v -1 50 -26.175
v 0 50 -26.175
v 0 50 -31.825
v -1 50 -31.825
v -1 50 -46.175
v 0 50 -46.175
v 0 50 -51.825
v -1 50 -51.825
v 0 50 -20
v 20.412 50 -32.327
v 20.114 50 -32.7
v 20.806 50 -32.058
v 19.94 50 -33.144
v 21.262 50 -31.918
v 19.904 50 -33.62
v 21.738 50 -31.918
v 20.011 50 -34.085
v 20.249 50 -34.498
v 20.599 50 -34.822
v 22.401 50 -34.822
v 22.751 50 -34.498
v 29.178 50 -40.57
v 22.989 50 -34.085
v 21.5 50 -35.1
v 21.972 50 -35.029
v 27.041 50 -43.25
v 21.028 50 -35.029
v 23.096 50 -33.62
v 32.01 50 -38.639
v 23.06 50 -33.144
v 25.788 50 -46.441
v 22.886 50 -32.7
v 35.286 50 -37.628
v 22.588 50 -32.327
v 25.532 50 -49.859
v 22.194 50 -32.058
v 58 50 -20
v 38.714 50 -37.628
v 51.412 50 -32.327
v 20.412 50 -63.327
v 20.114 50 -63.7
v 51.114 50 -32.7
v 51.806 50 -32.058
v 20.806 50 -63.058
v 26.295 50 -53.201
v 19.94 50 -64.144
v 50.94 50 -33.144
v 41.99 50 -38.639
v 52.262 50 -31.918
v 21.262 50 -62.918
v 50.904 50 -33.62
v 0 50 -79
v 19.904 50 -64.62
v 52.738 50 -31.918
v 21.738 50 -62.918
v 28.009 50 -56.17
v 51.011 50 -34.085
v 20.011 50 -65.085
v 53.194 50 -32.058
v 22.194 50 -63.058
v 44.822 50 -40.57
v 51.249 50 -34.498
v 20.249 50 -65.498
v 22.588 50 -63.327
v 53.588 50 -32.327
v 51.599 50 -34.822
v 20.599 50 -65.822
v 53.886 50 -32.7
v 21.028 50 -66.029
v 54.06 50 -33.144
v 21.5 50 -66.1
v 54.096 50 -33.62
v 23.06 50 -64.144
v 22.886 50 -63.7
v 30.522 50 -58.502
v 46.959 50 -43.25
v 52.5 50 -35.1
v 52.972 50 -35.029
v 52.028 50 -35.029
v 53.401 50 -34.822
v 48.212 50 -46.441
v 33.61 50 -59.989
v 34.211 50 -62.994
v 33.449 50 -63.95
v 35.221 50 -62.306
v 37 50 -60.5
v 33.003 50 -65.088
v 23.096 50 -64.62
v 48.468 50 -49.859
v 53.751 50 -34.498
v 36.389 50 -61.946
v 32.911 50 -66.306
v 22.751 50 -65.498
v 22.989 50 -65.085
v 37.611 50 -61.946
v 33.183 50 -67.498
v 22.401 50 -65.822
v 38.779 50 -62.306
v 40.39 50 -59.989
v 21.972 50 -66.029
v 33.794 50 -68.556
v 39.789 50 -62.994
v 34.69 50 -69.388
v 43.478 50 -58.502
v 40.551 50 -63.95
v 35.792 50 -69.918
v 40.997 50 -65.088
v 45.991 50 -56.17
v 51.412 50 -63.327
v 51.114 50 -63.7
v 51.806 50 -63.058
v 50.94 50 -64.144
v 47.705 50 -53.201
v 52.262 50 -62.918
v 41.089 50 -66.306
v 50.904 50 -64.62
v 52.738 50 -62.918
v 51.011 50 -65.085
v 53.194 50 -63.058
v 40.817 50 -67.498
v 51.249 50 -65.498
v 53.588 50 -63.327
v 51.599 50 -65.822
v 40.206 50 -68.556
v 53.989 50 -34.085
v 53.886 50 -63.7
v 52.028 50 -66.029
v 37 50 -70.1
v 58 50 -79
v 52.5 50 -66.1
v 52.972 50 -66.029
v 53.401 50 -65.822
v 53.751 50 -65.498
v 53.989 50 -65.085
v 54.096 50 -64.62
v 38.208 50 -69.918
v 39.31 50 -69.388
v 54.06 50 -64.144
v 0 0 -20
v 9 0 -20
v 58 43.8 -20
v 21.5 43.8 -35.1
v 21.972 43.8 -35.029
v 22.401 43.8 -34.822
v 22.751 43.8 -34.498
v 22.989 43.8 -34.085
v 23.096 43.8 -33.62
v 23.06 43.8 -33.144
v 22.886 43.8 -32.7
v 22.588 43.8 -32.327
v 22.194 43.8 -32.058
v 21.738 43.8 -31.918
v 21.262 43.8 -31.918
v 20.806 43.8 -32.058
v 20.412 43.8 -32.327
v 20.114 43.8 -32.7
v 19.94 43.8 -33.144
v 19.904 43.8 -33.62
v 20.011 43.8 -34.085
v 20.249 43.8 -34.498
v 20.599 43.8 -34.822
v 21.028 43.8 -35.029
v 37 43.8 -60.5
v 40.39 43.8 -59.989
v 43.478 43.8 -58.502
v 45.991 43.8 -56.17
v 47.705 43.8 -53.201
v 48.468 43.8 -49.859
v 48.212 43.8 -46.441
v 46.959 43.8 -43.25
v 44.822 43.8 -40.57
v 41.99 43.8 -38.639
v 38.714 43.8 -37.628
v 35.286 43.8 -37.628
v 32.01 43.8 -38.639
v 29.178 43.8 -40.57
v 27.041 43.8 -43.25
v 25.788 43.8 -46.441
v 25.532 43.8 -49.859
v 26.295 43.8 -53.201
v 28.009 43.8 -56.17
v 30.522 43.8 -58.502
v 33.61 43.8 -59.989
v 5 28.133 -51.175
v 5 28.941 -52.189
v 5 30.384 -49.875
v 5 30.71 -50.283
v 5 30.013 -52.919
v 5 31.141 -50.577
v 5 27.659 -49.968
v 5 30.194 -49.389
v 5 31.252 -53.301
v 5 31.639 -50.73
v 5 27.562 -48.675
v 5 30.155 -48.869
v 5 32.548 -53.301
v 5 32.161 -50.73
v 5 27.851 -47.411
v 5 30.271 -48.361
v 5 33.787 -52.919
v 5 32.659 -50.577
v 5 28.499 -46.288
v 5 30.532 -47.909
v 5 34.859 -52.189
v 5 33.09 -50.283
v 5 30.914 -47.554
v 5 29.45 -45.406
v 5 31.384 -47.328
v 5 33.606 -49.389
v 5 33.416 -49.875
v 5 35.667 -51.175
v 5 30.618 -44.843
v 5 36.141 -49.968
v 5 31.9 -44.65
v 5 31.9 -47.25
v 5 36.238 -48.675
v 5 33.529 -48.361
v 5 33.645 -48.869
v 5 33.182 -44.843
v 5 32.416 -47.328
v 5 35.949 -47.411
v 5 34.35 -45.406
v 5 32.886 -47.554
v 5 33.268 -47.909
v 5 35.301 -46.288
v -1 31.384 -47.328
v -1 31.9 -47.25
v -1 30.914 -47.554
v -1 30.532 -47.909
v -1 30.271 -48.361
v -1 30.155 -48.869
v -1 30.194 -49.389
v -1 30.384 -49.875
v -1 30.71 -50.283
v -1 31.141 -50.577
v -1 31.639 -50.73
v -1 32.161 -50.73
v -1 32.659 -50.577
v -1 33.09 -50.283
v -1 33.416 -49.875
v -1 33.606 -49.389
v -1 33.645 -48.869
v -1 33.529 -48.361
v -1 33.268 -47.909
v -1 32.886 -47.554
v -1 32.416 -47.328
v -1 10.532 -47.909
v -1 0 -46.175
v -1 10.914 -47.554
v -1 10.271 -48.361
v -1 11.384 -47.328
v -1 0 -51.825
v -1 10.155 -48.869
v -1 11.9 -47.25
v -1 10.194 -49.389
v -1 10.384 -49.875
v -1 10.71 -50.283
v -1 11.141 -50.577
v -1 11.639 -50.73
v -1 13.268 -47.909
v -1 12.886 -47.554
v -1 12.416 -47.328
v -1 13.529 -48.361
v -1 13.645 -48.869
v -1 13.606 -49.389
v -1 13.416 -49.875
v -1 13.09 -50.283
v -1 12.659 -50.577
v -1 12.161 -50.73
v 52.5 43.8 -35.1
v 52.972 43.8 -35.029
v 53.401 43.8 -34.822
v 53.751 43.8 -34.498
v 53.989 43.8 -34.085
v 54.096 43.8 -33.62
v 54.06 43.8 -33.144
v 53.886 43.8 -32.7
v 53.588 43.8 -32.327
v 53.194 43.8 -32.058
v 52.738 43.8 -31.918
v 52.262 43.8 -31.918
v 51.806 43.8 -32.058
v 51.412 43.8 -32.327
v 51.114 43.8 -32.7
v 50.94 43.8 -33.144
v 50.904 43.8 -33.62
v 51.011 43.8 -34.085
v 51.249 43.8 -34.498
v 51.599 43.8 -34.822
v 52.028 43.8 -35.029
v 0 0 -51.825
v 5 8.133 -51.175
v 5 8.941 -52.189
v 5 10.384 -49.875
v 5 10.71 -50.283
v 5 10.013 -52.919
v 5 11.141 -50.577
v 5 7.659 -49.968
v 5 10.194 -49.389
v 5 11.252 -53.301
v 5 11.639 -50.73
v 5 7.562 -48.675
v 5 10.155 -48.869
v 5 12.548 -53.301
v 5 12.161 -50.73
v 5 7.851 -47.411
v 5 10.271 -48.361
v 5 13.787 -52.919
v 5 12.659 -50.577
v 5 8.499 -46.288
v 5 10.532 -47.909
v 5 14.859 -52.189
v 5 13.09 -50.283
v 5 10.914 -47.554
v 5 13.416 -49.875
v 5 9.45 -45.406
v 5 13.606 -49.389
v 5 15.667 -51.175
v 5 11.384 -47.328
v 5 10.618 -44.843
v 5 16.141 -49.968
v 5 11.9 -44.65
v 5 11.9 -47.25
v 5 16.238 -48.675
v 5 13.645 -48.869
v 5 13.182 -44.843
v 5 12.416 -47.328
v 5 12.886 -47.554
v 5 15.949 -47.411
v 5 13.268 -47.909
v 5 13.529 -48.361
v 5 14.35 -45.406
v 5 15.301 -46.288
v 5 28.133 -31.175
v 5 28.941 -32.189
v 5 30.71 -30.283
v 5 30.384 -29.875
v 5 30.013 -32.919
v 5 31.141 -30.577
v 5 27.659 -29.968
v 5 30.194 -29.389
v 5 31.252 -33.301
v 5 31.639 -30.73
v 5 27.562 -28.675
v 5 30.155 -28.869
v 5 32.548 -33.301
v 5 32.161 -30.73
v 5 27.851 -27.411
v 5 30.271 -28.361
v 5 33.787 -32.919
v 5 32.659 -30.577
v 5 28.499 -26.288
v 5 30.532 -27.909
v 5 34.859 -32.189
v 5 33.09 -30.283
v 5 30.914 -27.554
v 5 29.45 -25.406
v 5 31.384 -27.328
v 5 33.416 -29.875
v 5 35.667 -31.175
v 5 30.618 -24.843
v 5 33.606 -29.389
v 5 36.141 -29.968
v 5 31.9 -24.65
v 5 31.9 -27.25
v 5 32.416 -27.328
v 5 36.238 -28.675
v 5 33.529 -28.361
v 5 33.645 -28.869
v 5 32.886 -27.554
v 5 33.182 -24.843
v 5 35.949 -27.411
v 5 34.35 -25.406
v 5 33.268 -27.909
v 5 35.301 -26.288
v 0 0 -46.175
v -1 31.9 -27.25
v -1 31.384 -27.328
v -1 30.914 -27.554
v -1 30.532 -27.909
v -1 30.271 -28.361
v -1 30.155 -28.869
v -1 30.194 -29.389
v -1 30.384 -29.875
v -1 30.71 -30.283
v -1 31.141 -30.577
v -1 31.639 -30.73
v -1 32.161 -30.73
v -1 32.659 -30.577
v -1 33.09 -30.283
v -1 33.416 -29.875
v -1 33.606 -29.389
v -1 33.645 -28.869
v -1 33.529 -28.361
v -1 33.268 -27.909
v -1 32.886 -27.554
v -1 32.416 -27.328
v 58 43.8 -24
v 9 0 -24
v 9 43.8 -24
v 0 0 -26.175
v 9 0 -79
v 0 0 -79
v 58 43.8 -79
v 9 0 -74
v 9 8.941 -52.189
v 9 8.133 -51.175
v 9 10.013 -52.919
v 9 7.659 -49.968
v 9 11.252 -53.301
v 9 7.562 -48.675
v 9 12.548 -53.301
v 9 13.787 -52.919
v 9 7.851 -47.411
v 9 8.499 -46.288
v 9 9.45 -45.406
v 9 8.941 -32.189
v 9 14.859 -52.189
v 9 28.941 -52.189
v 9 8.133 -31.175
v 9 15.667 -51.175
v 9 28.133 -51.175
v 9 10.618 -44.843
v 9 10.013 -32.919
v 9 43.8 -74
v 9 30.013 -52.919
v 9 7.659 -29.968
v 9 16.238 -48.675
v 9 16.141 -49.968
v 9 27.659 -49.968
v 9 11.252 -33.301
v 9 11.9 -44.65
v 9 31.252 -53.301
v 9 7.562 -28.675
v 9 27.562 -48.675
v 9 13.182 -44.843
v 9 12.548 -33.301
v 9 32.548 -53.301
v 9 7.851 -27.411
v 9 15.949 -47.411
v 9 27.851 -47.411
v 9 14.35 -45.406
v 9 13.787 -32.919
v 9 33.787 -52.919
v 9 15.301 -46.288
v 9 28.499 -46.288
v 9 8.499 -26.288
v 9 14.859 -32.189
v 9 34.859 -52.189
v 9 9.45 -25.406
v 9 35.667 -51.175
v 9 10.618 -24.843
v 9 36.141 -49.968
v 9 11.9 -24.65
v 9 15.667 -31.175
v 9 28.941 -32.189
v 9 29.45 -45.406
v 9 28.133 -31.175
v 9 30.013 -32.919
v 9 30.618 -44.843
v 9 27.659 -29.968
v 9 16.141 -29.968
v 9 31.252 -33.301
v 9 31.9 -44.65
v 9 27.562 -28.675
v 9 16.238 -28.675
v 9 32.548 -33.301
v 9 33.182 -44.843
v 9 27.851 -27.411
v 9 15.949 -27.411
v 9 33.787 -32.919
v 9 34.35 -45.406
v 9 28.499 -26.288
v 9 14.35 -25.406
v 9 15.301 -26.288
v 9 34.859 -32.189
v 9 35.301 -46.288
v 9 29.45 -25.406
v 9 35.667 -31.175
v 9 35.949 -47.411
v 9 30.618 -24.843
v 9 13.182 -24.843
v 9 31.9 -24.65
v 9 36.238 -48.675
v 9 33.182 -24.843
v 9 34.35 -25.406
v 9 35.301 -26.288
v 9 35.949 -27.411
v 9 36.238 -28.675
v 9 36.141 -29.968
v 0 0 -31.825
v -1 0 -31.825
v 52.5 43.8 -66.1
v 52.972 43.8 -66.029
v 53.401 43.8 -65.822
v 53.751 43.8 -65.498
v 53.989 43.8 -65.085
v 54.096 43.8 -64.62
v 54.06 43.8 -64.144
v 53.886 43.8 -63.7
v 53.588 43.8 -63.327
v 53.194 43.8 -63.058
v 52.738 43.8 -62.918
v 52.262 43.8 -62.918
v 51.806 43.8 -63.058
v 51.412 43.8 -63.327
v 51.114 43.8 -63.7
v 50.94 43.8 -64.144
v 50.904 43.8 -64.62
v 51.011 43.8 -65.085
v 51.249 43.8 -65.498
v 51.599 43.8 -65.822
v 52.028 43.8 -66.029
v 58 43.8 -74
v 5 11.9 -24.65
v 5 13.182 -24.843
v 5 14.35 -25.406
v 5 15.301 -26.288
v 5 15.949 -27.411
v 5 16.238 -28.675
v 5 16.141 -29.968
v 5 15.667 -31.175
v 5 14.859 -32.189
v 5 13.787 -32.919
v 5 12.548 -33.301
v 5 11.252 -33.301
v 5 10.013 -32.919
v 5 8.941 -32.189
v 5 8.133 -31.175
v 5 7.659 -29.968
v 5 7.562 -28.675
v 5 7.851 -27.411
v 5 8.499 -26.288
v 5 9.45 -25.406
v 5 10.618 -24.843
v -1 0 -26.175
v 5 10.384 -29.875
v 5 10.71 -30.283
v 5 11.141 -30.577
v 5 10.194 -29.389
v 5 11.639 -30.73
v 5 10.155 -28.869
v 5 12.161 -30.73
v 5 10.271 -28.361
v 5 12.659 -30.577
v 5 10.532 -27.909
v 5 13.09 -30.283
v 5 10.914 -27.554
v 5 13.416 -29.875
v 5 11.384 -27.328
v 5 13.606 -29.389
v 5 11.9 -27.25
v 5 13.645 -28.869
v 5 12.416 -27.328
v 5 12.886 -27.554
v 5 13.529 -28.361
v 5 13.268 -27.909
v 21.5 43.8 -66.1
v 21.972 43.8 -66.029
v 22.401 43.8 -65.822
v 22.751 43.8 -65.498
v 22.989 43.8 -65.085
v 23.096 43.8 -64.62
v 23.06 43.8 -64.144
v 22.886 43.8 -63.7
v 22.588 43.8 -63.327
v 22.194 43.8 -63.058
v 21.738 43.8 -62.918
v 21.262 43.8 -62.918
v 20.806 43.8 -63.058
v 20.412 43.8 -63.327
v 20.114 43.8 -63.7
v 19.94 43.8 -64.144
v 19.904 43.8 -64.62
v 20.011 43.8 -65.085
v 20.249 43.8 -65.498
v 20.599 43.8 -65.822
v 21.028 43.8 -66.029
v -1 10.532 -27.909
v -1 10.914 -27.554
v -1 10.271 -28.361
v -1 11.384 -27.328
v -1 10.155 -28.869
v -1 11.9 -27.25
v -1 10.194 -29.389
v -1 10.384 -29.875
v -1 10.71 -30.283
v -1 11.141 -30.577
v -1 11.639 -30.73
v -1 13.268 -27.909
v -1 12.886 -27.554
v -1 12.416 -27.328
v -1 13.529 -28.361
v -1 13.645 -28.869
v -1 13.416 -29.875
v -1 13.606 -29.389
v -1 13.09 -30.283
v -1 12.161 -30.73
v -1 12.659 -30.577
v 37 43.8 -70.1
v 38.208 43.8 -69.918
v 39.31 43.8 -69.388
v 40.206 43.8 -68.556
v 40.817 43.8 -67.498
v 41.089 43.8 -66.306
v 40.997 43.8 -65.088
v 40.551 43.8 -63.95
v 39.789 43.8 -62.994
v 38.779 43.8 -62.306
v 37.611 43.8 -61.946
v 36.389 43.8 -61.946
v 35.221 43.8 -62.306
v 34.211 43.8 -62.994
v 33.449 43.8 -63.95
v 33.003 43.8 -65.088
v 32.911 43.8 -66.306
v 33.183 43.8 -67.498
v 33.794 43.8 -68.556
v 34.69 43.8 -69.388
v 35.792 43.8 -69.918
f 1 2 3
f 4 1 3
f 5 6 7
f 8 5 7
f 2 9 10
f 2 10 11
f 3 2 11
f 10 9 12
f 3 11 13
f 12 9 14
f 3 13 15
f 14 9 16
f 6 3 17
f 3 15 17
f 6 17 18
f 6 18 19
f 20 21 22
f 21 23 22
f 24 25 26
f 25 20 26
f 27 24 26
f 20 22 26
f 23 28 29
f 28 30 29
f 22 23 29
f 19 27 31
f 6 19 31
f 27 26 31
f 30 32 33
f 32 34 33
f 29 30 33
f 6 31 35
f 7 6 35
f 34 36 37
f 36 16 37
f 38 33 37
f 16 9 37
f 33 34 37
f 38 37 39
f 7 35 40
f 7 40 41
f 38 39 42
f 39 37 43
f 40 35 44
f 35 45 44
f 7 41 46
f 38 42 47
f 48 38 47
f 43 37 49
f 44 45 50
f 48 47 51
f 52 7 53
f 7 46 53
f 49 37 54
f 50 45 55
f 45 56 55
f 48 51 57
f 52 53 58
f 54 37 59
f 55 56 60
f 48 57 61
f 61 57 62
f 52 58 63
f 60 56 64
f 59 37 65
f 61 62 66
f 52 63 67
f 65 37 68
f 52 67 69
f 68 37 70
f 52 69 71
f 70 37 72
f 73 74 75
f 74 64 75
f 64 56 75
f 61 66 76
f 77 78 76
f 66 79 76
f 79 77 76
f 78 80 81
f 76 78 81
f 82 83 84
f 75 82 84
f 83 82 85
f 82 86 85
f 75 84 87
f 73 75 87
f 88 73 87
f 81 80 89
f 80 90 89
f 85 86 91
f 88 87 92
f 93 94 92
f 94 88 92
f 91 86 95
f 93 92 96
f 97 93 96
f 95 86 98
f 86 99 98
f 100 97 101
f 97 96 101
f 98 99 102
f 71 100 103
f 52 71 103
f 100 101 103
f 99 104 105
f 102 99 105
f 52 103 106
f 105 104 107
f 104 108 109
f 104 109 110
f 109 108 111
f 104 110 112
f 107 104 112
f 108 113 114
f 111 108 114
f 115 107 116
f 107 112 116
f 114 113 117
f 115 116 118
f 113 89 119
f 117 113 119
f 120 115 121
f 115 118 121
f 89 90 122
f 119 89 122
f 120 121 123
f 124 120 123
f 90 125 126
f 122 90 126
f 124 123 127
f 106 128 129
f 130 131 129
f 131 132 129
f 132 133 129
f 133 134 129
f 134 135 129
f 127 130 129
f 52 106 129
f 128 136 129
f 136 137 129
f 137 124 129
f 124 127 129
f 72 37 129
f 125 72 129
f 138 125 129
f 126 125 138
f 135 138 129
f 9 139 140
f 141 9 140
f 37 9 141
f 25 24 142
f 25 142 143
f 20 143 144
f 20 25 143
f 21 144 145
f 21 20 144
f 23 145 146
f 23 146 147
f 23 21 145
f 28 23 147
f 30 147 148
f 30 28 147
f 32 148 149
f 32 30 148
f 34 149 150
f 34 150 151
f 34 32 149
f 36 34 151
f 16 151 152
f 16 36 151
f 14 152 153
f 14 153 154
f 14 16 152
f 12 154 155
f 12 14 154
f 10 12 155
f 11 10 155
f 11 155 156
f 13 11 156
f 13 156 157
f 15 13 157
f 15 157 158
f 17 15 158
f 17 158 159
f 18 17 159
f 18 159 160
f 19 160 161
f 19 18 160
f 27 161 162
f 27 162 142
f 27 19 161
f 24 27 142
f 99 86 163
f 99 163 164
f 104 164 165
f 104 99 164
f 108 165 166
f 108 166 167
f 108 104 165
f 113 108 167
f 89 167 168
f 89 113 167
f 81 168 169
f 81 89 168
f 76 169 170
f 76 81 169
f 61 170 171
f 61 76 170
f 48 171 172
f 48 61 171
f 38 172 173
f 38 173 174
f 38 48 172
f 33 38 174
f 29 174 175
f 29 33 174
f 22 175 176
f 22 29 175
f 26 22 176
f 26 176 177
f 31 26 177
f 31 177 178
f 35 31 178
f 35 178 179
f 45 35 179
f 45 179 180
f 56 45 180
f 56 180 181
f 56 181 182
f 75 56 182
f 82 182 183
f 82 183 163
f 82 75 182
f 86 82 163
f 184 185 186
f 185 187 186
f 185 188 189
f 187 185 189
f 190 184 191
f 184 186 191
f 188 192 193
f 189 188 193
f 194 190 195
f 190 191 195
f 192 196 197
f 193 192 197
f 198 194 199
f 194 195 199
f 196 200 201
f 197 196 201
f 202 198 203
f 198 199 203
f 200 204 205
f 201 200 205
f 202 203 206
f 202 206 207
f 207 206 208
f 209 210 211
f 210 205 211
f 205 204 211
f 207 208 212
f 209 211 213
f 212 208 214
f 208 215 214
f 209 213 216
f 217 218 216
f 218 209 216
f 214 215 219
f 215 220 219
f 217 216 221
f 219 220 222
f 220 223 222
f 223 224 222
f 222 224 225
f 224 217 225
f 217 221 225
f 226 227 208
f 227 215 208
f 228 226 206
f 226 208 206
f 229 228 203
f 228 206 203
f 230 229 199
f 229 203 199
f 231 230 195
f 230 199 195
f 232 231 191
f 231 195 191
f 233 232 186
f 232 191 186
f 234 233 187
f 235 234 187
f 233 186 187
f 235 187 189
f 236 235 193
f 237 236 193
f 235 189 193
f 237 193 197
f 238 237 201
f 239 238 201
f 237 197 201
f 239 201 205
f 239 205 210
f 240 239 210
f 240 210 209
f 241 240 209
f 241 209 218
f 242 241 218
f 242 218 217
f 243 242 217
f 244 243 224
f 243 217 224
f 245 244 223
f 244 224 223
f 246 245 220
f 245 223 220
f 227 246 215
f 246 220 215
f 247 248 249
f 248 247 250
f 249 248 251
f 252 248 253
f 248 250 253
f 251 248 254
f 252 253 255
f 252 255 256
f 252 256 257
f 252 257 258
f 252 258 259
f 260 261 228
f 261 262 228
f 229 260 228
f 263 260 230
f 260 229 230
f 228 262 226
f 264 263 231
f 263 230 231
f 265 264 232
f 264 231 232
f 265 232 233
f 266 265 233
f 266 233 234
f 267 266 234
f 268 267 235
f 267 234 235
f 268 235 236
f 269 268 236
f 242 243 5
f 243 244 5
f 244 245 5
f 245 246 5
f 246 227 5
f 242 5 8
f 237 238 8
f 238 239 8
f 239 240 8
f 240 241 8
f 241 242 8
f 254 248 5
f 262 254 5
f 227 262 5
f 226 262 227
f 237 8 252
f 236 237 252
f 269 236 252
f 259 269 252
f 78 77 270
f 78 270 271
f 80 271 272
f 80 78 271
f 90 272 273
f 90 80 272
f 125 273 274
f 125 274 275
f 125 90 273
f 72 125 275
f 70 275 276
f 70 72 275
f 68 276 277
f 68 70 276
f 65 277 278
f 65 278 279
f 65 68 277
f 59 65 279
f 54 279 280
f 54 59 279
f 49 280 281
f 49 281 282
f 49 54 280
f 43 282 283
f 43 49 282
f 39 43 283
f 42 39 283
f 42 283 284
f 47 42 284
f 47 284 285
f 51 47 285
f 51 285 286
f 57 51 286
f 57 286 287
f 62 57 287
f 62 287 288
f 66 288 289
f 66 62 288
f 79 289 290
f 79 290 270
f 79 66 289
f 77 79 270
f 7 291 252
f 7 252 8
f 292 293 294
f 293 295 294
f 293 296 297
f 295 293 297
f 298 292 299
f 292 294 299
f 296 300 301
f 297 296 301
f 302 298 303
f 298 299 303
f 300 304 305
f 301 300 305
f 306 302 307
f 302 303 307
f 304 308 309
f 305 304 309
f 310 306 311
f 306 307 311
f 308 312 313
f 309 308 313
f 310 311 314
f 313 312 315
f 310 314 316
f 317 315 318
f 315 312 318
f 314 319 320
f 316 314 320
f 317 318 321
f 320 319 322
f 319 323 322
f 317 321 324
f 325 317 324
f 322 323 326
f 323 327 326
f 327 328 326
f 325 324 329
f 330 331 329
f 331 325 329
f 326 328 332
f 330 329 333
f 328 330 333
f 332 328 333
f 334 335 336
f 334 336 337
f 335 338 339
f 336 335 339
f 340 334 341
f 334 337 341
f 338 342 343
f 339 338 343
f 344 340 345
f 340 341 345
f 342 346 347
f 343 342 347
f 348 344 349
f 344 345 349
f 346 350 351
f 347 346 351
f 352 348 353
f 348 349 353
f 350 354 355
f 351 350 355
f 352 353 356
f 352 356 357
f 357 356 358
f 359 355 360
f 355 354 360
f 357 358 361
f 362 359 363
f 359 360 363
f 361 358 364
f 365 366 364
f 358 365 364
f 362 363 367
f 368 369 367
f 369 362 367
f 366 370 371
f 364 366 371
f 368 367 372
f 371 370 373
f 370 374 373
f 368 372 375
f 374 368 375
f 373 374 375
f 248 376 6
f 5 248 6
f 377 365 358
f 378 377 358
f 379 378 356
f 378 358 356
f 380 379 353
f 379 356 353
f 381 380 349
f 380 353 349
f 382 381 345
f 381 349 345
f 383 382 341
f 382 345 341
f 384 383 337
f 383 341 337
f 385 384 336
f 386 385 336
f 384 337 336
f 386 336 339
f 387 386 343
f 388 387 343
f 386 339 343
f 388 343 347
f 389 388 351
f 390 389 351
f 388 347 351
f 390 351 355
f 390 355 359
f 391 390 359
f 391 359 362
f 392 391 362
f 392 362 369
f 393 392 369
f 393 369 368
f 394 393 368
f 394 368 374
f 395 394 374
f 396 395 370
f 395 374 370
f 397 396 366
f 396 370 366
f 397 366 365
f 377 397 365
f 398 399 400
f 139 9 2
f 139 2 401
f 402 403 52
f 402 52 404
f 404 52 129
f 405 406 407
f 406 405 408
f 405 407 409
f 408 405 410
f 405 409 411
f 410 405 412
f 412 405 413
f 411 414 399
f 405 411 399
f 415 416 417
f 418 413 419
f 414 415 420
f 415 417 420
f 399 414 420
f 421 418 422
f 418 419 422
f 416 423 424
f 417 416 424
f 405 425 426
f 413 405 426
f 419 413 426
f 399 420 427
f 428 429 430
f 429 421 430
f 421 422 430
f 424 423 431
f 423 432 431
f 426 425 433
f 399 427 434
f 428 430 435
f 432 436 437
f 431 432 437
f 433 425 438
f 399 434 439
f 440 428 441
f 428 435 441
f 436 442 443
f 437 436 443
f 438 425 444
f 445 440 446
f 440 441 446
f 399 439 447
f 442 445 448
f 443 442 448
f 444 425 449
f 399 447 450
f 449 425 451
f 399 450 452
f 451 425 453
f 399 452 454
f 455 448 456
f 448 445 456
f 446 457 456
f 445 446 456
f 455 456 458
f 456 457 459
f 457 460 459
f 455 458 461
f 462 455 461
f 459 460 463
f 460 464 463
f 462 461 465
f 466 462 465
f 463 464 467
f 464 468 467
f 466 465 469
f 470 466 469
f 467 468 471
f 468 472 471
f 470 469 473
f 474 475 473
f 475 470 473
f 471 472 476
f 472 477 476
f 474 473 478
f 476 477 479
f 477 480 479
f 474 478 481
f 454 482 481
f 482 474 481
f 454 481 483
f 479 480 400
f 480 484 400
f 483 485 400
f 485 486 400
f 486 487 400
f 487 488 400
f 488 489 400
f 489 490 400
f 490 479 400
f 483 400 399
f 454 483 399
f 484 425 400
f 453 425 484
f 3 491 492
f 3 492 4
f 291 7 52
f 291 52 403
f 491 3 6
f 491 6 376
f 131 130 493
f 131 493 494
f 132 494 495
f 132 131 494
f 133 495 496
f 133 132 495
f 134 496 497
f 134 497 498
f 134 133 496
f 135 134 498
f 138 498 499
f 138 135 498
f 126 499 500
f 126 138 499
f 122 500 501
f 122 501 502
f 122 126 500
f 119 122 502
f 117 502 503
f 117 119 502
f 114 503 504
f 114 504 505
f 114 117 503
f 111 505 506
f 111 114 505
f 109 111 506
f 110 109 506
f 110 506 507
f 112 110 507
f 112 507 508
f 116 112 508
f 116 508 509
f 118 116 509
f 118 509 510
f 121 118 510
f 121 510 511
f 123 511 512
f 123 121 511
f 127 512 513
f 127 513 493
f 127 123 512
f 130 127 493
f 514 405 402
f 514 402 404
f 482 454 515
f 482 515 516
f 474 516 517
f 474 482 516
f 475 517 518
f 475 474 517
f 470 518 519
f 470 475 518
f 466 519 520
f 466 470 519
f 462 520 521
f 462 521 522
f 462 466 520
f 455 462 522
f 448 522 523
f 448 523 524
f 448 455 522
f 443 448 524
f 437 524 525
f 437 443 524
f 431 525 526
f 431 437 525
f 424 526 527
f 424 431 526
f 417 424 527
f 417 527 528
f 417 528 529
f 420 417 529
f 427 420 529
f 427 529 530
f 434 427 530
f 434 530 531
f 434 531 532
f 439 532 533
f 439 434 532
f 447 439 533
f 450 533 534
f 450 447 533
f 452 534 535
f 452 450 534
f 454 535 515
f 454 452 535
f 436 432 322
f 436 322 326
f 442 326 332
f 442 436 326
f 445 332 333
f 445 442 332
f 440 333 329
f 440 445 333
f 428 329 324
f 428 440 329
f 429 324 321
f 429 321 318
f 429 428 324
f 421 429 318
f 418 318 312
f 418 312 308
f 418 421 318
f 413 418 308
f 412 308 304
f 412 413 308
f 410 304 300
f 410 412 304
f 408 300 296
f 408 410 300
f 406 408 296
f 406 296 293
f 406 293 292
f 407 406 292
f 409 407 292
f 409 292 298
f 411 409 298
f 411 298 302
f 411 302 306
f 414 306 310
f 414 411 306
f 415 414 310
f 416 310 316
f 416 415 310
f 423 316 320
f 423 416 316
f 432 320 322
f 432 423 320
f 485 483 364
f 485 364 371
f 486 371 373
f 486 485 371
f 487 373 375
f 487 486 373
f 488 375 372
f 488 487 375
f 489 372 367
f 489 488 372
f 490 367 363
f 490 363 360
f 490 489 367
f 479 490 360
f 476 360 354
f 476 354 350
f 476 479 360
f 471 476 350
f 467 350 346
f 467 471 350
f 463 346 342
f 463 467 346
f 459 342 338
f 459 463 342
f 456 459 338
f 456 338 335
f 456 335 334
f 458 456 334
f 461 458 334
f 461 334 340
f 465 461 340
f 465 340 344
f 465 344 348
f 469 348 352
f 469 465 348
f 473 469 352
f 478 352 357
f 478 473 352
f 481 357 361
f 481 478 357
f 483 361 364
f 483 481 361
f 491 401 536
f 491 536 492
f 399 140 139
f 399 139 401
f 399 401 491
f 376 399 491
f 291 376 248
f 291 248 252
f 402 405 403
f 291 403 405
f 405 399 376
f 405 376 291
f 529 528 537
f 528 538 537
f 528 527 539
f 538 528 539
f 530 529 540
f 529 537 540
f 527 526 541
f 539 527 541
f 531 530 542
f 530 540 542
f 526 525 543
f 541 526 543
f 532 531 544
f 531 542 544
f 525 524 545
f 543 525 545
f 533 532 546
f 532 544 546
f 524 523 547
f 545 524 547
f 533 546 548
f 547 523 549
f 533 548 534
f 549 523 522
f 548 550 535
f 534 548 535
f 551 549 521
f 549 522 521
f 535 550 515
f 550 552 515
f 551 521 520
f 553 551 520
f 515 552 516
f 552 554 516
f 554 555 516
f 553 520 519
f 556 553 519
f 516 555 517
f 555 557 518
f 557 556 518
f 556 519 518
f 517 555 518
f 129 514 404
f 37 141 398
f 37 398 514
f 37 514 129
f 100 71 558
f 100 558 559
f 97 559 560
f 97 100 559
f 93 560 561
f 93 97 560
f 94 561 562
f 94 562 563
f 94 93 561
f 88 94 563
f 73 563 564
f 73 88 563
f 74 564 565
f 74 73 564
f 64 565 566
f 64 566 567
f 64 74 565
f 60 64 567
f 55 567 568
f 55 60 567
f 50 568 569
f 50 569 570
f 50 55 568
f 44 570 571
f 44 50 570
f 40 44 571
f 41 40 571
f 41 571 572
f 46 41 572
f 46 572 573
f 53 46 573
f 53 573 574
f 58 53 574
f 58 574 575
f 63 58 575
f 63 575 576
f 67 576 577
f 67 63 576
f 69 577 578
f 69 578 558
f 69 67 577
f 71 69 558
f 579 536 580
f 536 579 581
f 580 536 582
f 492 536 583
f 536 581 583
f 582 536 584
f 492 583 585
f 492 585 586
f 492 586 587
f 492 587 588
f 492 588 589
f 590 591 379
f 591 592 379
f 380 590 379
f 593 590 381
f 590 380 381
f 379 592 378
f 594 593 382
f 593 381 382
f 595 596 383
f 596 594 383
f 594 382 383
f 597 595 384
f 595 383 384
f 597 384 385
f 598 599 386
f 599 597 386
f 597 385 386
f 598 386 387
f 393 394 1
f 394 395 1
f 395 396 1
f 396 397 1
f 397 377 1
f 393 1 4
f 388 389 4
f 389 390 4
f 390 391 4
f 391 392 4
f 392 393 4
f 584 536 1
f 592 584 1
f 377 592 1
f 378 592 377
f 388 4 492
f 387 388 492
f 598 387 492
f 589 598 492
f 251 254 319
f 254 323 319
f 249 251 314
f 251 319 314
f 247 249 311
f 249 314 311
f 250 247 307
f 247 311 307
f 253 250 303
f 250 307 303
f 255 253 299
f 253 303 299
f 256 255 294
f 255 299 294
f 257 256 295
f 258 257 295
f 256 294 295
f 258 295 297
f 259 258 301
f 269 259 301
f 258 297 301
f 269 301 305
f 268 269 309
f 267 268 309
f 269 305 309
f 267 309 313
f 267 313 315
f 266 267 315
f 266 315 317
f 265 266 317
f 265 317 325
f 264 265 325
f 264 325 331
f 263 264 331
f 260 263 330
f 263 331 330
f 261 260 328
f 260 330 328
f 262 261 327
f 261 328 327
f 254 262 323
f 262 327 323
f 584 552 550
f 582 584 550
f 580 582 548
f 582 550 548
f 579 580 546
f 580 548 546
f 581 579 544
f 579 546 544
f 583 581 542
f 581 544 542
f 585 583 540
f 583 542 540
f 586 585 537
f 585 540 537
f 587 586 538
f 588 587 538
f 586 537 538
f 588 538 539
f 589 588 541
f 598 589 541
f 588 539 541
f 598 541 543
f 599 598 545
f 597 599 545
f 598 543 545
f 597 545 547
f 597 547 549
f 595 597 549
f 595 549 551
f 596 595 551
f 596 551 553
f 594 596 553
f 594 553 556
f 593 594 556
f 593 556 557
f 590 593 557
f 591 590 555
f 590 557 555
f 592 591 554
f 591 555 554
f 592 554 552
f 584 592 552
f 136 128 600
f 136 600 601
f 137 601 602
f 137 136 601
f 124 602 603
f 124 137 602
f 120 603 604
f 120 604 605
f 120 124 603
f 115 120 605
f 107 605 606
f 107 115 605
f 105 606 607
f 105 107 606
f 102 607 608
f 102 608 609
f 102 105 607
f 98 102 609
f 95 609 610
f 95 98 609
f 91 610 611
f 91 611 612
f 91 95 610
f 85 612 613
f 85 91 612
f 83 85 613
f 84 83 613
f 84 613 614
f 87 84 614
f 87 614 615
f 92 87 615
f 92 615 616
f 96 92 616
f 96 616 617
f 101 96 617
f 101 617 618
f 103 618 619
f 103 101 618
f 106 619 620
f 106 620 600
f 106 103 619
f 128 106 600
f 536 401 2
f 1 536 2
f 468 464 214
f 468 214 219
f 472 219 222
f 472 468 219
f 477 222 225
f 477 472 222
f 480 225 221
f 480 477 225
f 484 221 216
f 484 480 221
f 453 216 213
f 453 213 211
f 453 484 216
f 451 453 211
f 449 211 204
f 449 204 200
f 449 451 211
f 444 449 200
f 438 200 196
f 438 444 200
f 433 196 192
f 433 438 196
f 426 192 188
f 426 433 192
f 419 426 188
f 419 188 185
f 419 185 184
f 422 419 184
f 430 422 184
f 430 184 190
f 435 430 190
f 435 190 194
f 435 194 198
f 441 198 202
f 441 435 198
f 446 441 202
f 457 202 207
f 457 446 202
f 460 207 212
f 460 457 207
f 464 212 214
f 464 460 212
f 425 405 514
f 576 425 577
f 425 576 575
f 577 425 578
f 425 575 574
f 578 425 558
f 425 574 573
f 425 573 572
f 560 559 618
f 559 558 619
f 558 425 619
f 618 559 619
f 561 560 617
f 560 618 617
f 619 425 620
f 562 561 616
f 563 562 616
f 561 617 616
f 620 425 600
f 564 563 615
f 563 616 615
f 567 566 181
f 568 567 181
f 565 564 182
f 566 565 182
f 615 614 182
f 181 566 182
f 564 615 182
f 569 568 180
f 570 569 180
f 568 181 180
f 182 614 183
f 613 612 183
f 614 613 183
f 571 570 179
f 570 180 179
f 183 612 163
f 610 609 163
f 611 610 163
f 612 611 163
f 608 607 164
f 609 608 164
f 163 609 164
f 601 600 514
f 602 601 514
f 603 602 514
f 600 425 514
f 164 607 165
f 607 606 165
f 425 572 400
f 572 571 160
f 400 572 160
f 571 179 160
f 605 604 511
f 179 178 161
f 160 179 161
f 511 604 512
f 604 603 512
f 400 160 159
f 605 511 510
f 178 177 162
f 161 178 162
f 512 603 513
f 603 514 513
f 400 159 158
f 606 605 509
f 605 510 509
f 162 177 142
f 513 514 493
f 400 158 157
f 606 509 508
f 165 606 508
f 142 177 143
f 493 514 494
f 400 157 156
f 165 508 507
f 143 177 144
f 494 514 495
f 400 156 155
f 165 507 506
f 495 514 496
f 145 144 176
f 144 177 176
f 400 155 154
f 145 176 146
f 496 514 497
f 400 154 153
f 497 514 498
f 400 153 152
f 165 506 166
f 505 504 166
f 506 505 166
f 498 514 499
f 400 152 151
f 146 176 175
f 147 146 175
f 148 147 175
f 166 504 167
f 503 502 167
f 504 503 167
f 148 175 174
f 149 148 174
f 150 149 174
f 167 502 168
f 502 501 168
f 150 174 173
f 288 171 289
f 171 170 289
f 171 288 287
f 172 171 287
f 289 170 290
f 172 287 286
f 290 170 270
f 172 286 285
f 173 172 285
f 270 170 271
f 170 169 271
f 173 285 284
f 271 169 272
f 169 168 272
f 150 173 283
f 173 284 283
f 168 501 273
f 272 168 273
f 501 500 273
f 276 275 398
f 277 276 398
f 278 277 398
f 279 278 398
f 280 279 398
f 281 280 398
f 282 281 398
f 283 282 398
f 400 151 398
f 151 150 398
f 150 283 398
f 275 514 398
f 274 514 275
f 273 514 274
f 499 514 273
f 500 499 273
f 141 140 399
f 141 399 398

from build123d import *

# Parameters (mm, degrees)
RESSALTO_EXTRUS_O1_DEPTH = 59
ESBO_O2_W                = 50
ESBO_O2_H                = 43.8
CORTE_EXTRUS_O1_DEPTH    = 49
ESBO_O3_R                = 1.75
CORTE_EXTRUS_O2_DEPTH    = 92.553263186
ESBO_O4_W                = 5.65
ESBO_O4_H                = 50
ESBO_O4_R                = 1.75
RESSALTO_EXTRUS_O2_DEPTH = 1
ESBO_O5_R                = 4.35
CORTE_EXTRUS_O3_DEPTH    = 4
ESBO_O6_R                = 11.5
ESBO_O6_R_2              = 1.6
ESBO_O6_R_3              = 4.1
CORTE_EXTRUS_O4_DEPTH    = 6.2
ESBO_O7_W                = 146.645029728
ESBO_O7_H                = 95.479941405
CORTE_EXTRUS_O5_DEPTH    = 139


with BuildPart() as part:
    # Esboço1 → Ressalto-extrusão1 (new body)
    with BuildSketch(Plane.XY):
        Polygon((9, 0), (58, 43.8), (58, 50), (0, 50), (0, 0), align=None)
    extrude(amount=RESSALTO_EXTRUS_O1_DEPTH)

    # Esboço2 → Corte-extrusão1 (cut)
    with BuildSketch(Plane(origin=(58, 0, 0), x_dir=(0, 0, -1), z_dir=(1, 0, 0))):
        with Locations((-29, 21.9)):
            Rectangle(ESBO_O2_W, ESBO_O2_H)
    extrude(amount=-CORTE_EXTRUS_O1_DEPTH, mode=Mode.SUBTRACT)

    # Esboço3 → Corte-extrusão2 (cut, through all)
    with BuildSketch(Plane(origin=(9, 0, 0), x_dir=(0, 0, -1), z_dir=(1, 0, 0))):
        with Locations((-29, 11.9)):
            Circle(ESBO_O3_R)
        with Locations((-29, 31.9)):
            Circle(ESBO_O3_R)
        with Locations((-9, 31.9)):
            Circle(ESBO_O3_R)
        with Locations((-9, 11.9)):
            Circle(ESBO_O3_R)
    extrude(amount=-CORTE_EXTRUS_O2_DEPTH, mode=Mode.SUBTRACT)

    # Esboço4 → Ressalto-extrusão2 (add)
    # profile 1 of 2: a face of its own
    with BuildSketch(Plane.ZY):
        with Locations((9, 25)):
            Rectangle(ESBO_O4_W, ESBO_O4_H)
        with Locations(Location((9, 11.9, 0), (0, 0, 180))):
            Circle(ESBO_O4_R, mode=Mode.SUBTRACT)
        with Locations(Location((9, 31.9, 0), (0, 0, 180))):
            Circle(ESBO_O4_R, mode=Mode.SUBTRACT)
    # profile 2 of 2: a face of its own
    with BuildSketch(Plane.ZY):
        with Locations((29, 25)):
            Rectangle(ESBO_O4_W, ESBO_O4_H)
        with Locations(Location((29, 11.9, 0), (0, 0, 180))):
            Circle(ESBO_O4_R, mode=Mode.SUBTRACT)
        with Locations(Location((29, 31.9, 0), (0, 0, 180))):
            Circle(ESBO_O4_R, mode=Mode.SUBTRACT)
    extrude(amount=RESSALTO_EXTRUS_O2_DEPTH)

    # Esboço5 → Corte-extrusão3 (cut)
    with BuildSketch(Plane(origin=(9, 0, 0), x_dir=(0, 0, -1), z_dir=(1, 0, 0))):
        with Locations((-29, 31.9)):
            Circle(ESBO_O5_R)
        with Locations((-9, 31.9)):
            Circle(ESBO_O5_R)
        with Locations((-29, 11.9)):
            Circle(ESBO_O5_R)
        with Locations((-9, 11.9)):
            Circle(ESBO_O5_R)
    extrude(amount=-CORTE_EXTRUS_O3_DEPTH, mode=Mode.SUBTRACT)

    # Esboço6 → Corte-extrusão4 (cut)
    with BuildSketch(Plane(origin=(0, 50, 0), x_dir=(1, 0, 0), z_dir=(0, 1, 0))):
        with Locations(Location((37, -29, 0), (0, 0, 270))):
            Circle(ESBO_O6_R)
        with Locations(Location((21.5, -13.5, 0), (0, 0, 270))):
            Circle(ESBO_O6_R_2)
        with Locations(Location((52.5, -13.5, 0), (0, 0, 270))):
            Circle(ESBO_O6_R_2)
        with Locations(Location((52.5, -44.5, 0), (0, 0, 270))):
            Circle(ESBO_O6_R_2)
        with Locations(Location((21.5, -44.5, 0), (0, 0, 270))):
            Circle(ESBO_O6_R_2)
        with Locations(Location((37, -46, 0), (0, 0, 270))):
            Circle(ESBO_O6_R_3)
    extrude(amount=-CORTE_EXTRUS_O4_DEPTH, mode=Mode.SUBTRACT)


with BuildPart() as body_2:
    # Espelhar2: mirrored copy
    add(part.part.mirror(Plane(origin=(0, 0, -10), x_dir=(1, 0, 0), z_dir=(0, 0, -1))))


with BuildPart() as part_1:
    add(part.part)

    # Esboço7 → Corte-extrusão5 (cut)
    with BuildSketch(Plane(origin=(0, 0, -10), x_dir=(-1, 0, 0), z_dir=(0, 0, -1))):
        with Locations((-17.98187812, 24.060524641)):
            Rectangle(ESBO_O7_W, ESBO_O7_H)
    extrude(amount=-CORTE_EXTRUS_O5_DEPTH, mode=Mode.SUBTRACT)


solid = body_2.part
